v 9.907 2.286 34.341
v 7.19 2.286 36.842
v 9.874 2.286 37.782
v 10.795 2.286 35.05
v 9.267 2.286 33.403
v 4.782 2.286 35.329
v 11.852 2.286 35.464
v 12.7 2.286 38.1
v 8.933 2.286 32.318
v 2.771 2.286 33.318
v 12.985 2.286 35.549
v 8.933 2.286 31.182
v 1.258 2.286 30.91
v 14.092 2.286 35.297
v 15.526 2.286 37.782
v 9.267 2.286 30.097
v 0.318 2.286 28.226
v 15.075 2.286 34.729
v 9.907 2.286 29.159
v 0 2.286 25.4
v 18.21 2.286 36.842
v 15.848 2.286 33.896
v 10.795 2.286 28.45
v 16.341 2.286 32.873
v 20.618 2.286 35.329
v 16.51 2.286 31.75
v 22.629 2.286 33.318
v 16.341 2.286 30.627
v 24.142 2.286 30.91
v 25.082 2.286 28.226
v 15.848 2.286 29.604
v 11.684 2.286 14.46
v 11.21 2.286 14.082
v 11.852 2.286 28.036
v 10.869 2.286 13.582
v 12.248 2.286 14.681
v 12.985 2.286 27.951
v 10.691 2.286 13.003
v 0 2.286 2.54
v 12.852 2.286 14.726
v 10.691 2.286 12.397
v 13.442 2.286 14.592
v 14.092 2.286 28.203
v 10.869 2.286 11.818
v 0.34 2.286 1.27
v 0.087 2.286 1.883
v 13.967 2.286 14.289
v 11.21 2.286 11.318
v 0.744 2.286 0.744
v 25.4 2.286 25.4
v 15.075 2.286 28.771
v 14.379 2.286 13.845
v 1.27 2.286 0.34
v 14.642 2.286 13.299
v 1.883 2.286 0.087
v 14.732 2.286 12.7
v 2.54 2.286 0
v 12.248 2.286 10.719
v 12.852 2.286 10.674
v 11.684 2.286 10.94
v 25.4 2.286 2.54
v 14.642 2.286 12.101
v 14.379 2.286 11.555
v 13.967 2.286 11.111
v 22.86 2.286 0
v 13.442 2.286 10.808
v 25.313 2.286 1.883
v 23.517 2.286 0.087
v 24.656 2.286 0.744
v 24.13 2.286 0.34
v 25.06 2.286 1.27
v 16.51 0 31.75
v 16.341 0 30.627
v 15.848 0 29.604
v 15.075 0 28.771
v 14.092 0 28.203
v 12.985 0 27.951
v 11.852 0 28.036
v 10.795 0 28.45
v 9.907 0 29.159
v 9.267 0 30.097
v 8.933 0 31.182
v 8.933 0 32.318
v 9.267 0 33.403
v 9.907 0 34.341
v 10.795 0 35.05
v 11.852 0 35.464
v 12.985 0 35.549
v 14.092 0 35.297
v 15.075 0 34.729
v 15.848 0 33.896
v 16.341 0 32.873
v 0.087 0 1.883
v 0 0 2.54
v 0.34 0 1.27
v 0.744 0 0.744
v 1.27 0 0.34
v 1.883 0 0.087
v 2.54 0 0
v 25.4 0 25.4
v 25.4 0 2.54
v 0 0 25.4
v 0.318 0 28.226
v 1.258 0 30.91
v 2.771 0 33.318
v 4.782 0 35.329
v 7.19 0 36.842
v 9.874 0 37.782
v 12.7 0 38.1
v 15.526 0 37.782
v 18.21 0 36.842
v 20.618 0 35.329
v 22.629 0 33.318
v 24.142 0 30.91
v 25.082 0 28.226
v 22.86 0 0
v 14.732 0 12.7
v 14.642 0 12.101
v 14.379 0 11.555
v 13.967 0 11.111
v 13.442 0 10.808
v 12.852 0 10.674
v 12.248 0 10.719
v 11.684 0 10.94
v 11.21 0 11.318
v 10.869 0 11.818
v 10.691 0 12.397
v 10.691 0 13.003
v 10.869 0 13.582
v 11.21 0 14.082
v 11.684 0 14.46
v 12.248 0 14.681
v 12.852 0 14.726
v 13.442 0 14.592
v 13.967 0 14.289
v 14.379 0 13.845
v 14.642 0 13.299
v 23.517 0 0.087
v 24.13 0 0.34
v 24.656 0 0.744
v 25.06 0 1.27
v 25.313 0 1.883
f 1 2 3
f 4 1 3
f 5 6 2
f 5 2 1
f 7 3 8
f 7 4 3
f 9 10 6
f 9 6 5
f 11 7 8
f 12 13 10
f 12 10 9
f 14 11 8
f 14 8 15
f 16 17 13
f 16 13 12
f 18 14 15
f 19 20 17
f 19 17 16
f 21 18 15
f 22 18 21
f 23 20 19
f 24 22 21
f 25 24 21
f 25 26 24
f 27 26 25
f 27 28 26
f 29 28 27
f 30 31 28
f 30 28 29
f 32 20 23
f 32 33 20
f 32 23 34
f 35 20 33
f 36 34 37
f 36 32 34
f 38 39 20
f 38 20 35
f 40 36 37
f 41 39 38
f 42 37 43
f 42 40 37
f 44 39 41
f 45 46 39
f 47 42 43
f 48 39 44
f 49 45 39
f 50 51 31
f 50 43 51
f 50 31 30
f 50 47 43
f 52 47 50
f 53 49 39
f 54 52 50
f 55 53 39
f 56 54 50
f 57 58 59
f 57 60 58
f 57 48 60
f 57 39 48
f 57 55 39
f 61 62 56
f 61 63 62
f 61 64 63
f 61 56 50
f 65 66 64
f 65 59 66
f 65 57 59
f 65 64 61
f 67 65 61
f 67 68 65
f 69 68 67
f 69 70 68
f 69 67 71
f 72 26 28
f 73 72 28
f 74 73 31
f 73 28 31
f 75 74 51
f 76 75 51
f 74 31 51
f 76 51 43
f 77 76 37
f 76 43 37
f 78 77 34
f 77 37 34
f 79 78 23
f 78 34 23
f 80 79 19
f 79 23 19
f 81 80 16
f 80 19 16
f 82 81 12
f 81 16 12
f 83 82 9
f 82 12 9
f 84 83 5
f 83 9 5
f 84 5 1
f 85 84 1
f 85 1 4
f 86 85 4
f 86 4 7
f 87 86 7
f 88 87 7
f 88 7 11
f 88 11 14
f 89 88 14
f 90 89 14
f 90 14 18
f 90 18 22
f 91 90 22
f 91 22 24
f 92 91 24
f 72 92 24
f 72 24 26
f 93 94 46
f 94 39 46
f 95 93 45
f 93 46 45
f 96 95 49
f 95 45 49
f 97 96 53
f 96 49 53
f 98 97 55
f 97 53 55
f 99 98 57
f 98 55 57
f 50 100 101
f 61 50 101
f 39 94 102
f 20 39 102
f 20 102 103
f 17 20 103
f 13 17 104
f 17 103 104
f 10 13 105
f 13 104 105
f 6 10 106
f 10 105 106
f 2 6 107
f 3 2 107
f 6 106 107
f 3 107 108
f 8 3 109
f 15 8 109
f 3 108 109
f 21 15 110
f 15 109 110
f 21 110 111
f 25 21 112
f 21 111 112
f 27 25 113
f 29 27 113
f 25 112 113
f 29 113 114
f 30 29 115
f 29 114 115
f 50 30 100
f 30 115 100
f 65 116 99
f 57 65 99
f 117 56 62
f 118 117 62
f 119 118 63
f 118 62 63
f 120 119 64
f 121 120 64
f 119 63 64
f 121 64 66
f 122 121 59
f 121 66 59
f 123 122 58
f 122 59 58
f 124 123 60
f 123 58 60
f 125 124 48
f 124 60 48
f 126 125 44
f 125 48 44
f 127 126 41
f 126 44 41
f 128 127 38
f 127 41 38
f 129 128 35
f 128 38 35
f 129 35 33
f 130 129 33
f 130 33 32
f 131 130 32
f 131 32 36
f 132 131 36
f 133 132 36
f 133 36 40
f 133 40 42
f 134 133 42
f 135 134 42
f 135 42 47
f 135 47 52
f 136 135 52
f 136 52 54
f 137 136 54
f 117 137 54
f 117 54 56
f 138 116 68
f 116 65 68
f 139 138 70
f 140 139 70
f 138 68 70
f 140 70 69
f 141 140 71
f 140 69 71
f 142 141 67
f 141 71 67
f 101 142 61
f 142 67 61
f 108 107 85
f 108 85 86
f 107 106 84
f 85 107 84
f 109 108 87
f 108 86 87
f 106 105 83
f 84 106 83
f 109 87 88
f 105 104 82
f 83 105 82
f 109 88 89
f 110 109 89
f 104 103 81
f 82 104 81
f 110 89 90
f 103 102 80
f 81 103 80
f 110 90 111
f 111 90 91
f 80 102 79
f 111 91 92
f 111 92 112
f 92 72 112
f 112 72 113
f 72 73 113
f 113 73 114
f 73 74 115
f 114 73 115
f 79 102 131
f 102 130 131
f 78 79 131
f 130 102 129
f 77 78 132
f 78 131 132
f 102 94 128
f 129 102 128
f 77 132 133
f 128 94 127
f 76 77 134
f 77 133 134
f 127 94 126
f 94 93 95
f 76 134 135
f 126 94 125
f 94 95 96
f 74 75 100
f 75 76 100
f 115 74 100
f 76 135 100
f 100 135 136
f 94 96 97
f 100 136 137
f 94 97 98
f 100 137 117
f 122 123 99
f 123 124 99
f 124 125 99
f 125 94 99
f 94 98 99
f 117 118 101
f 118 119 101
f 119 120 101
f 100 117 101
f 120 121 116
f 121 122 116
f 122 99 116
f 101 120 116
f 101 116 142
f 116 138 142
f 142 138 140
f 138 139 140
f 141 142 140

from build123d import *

# Parameters (mm, degrees)
BOSS_EXTRUDE1_DEPTH     = 2.286
SKETCH2_R               = 2.032
SKETCH2_R_2             = 3.81
CUT_EXTRUDE1_DEPTH      = 1
CUT_EXTRUDE1_DEPTH_BACK = 3.286
FILLET1_R               = 2.54
FILLET2_R               = 2.54


with BuildPart() as part:
    # Sketch1 → Boss-Extrude1 (new body)
    with BuildSketch(Plane(origin=(0, 0, 0), x_dir=(1, 0, 0), z_dir=(0, 1, 0))):
        with BuildLine():
            ThreePointArc((25.4, -25.4), (12.7, -12.7), (0, -25.4))
            Line((0, -25.4), (25.4, -25.4))
        make_face()
        with BuildLine():
            Line((25.4, -25.4), (0, -25.4))
            ThreePointArc((0, -25.4), (12.7, -38.1), (25.4, -25.4))
        make_face()
        with BuildLine():
            Line((25.4, 0), (0, 0))
            Line((0, 0), (0, -25.4))
            ThreePointArc((0, -25.4), (12.7, -12.7), (25.4, -25.4))
            Line((25.4, -25.4), (25.4, 0))
        make_face()
    extrude(amount=BOSS_EXTRUDE1_DEPTH)

    # Sketch2 → Cut-Extrude1 (cut, two sides)
    with BuildSketch(Plane(origin=(0, 2.286, 0), x_dir=(1, 0, 0), z_dir=(0, 1, 0))) as cut_extrude1_sk:
        with Locations((12.7, -12.7)):
            Circle(SKETCH2_R)
        with Locations((12.7, -31.75)):
            Circle(SKETCH2_R_2)
    extrude(amount=CUT_EXTRUDE1_DEPTH, mode=Mode.SUBTRACT)
    extrude(cut_extrude1_sk.sketch, amount=-CUT_EXTRUDE1_DEPTH_BACK, mode=Mode.SUBTRACT)

    # Fillet1
    fillet1_edges = [part.edges().sort_by_distance(p)[0] for p in [
        (0, 1.143, 0),
    ]]
    fillet(fillet1_edges, radius=FILLET1_R)

    # Fillet2
    fillet2_edges = [part.edges().sort_by_distance(p)[0] for p in [
        (25.4, 1.143, 0),
    ]]
    fillet(fillet2_edges, radius=FILLET2_R)


solid = part.part
